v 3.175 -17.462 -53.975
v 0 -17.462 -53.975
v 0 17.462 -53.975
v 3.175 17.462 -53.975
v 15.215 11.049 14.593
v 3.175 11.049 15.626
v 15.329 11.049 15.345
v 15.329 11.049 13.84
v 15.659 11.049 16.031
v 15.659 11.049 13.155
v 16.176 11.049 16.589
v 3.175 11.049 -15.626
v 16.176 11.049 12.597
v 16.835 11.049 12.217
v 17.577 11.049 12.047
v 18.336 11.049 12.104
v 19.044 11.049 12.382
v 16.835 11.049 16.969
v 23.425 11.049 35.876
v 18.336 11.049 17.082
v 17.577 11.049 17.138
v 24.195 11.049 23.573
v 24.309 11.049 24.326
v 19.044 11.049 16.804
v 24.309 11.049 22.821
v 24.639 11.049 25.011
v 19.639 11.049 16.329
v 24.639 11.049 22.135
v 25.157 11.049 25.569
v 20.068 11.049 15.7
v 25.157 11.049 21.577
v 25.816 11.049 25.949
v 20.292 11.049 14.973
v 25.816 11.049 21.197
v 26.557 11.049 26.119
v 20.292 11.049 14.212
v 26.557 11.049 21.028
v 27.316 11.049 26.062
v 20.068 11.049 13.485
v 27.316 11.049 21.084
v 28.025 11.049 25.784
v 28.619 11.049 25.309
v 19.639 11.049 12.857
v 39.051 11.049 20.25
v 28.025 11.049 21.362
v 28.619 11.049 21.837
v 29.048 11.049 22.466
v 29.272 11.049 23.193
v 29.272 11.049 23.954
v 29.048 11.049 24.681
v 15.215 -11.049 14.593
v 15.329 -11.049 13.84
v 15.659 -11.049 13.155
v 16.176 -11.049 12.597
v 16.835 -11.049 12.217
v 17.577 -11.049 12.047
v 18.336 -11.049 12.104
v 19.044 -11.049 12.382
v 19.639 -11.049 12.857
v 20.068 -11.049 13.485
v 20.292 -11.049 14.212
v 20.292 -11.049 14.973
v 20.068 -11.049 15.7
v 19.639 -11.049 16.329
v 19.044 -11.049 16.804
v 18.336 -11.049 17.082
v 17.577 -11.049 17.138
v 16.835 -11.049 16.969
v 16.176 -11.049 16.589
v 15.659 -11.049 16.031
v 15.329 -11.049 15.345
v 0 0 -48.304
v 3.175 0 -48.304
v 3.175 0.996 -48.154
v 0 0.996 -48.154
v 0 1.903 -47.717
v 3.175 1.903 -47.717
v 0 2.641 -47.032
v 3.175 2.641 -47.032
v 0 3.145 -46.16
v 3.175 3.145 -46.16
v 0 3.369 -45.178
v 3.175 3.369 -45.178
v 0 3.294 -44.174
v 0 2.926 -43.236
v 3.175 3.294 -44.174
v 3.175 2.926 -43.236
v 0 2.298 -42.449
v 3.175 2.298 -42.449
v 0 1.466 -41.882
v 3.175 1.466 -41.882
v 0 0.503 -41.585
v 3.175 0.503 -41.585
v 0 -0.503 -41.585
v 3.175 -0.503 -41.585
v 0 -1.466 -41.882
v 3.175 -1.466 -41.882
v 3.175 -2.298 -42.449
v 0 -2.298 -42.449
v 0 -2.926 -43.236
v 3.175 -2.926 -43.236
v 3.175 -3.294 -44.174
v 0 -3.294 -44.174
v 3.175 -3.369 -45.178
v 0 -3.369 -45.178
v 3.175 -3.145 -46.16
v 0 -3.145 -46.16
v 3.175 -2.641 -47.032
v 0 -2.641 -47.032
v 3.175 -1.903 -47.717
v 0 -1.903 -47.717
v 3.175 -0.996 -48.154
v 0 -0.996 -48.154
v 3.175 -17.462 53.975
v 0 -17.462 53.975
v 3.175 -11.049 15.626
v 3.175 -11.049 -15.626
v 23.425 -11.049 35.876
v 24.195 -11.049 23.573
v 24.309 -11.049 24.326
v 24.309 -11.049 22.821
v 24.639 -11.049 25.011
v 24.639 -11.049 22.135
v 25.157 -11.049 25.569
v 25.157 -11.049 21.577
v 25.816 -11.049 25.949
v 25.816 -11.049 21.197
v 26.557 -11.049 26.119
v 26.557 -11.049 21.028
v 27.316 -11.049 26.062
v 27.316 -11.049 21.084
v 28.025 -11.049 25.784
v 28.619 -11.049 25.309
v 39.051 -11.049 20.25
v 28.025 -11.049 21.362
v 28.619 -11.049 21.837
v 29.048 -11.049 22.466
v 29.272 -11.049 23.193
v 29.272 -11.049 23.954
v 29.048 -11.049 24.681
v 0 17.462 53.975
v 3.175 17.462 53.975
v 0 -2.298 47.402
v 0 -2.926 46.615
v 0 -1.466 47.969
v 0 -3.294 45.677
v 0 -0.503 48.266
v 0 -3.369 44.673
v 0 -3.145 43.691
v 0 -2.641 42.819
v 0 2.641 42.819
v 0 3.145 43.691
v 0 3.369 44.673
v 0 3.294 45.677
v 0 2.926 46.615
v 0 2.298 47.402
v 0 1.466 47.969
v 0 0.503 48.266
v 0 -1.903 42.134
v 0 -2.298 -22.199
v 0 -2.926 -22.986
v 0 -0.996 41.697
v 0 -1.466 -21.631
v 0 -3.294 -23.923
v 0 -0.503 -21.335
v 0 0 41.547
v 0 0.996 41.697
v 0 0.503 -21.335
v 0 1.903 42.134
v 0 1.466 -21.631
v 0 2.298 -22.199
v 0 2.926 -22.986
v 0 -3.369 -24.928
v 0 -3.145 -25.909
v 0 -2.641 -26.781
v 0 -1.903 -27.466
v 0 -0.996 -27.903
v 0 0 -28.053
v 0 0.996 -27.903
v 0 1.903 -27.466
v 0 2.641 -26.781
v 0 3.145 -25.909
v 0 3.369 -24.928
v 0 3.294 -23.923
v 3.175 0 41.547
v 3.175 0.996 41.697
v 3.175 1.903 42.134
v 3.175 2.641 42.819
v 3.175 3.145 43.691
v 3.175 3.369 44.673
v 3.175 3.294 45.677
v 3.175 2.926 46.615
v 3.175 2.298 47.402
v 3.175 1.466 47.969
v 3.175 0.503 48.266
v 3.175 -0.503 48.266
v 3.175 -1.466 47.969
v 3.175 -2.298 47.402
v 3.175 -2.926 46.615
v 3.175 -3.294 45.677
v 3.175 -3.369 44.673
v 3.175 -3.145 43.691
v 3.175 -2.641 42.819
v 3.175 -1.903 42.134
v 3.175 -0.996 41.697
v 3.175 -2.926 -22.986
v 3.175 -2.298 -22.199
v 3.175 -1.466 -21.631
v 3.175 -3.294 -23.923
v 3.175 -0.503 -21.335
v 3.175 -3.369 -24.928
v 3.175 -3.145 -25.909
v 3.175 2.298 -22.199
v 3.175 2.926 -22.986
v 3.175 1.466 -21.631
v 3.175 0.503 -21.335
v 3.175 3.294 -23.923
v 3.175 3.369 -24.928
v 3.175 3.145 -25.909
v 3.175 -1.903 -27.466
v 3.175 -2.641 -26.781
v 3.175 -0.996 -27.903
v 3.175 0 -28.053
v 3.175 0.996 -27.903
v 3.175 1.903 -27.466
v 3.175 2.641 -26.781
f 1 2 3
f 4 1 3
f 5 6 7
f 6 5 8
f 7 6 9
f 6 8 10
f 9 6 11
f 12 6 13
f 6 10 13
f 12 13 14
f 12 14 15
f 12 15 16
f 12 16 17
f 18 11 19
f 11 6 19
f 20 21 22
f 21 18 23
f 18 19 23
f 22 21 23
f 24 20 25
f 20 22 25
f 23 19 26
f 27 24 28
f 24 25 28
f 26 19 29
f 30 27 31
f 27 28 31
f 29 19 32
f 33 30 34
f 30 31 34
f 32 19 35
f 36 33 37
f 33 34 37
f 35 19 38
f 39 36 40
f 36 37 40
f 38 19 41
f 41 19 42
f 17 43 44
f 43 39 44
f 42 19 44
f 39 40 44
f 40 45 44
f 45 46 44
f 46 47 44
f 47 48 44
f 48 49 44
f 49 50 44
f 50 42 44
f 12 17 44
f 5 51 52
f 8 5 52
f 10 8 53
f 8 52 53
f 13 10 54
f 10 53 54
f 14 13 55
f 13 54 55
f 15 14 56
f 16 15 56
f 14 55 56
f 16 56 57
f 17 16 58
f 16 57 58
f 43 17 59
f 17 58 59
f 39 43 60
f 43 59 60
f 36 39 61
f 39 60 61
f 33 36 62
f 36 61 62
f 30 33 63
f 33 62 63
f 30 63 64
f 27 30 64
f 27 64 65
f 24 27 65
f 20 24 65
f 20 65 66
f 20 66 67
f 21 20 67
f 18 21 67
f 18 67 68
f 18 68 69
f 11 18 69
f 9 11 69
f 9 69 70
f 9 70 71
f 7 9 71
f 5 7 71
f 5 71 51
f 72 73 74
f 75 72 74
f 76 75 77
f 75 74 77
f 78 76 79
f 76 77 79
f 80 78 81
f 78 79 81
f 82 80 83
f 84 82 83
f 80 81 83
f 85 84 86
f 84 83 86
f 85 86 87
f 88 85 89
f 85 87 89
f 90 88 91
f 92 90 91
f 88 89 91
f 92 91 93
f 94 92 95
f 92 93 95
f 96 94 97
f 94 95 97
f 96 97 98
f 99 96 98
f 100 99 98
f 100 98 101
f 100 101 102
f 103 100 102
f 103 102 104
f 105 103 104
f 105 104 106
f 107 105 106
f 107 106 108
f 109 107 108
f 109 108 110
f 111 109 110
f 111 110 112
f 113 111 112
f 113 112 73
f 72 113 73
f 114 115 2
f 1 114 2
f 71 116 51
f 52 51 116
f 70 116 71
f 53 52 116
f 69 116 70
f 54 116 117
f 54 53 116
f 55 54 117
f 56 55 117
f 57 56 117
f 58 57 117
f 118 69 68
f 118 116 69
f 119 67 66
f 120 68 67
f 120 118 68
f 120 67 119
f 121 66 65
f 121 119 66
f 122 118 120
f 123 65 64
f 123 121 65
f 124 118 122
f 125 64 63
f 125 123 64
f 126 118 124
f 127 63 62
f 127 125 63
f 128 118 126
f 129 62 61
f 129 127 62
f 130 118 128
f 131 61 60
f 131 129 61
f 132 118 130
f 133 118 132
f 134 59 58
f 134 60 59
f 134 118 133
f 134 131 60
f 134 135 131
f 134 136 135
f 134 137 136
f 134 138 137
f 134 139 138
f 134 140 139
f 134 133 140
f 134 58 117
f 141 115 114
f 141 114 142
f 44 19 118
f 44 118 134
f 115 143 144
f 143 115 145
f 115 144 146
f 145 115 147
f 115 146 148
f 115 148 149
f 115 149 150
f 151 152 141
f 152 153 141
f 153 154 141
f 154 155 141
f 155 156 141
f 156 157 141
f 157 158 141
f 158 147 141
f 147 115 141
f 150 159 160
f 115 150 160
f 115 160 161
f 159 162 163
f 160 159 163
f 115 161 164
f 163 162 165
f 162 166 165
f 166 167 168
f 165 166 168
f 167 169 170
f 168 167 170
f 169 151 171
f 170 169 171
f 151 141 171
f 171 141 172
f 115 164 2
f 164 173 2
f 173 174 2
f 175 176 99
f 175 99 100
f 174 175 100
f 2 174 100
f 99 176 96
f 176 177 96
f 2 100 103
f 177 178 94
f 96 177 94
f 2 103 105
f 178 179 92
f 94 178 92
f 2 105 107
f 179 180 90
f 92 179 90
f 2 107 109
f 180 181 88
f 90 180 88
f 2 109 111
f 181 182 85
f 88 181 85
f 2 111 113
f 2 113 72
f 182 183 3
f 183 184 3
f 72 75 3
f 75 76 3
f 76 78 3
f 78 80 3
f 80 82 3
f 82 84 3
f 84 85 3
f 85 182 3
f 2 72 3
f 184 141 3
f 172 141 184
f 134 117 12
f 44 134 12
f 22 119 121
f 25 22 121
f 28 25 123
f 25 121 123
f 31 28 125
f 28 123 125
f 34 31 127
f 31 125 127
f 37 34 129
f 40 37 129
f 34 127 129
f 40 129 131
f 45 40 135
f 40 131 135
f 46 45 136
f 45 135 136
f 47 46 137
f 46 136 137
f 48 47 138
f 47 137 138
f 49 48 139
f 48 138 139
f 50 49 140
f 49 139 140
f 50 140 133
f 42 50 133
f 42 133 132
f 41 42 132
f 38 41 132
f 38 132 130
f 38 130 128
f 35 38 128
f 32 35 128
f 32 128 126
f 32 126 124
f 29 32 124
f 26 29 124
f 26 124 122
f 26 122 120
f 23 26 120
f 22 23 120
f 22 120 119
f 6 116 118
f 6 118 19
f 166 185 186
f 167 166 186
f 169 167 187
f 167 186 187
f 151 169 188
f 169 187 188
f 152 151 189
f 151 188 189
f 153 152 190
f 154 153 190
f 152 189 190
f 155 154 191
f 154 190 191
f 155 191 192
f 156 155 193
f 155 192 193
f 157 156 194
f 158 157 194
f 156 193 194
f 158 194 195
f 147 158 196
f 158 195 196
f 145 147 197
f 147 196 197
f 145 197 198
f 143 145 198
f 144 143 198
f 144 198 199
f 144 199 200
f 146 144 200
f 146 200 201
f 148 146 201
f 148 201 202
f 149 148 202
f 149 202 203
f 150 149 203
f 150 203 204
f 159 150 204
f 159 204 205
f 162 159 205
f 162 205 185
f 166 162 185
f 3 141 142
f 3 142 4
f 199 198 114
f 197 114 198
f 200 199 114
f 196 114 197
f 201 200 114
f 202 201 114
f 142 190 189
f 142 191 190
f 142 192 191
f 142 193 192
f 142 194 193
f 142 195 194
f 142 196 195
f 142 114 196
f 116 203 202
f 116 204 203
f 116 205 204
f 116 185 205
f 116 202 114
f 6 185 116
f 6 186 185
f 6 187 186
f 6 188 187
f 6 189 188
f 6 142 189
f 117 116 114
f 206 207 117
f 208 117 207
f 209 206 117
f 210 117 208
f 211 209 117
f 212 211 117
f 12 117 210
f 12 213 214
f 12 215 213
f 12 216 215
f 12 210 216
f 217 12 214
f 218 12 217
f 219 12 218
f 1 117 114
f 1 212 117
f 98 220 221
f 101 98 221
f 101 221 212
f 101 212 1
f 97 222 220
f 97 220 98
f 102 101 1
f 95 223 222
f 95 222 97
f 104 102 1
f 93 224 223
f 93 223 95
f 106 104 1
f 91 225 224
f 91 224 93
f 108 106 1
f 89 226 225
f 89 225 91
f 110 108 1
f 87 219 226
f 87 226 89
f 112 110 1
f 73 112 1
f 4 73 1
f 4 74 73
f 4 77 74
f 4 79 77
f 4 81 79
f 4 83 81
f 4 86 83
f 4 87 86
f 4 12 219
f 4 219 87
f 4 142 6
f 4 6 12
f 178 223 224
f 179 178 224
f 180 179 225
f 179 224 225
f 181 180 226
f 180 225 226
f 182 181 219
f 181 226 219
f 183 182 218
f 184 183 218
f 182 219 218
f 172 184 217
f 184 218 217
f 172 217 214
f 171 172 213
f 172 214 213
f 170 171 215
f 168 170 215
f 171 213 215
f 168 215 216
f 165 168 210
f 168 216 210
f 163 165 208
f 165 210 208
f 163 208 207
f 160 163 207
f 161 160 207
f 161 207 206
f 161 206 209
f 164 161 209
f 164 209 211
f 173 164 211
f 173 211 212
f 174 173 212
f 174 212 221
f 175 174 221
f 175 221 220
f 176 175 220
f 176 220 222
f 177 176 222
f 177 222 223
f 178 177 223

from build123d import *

# Parameters (mm, degrees)
SKETCH1_W               = 107.95
SKETCH1_H               = 34.925
BOSS_EXTRUDE1_DEPTH     = 3.175
BOSS_EXTRUDE2_REACH     = 92.429
SKETCH4_W               = 22.098
SKETCH4_H               = 22.098
CUT_EXTRUDE1_REACH      = 69.122
SKETCH5_R               = 3.3782
F_1_4_20_TAPPED_HOLE1_D = 5.1054


with BuildPart() as part:
    # Sketch1 → Boss-Extrude1 (new body)
    with BuildSketch(Plane(origin=(0, 0, 0), x_dir=(0, 0, -1), z_dir=(1, 0, 0))):
        Rectangle(SKETCH1_W, SKETCH1_H)
    extrude(amount=BOSS_EXTRUDE1_DEPTH)

    # Boss-Extrude2: up to this plane
    boss_extrude2_end = Plane(origin=(3.175, 0, 0), z_dir=(1, 0, 0))
    # Sketch4 → Boss-Extrude2 (add, up to the surface)
    with BuildSketch(Plane(origin=(29.650800378, 0, 29.650800378), x_dir=(0.707106781186546, 0, -0.707106781186549), z_dir=(0.707106781186549, 0, 0.707106781186546)), mode=Mode.PRIVATE) as boss_extrude2_sk1:
        with Locations((2.24506403, 0)):
            Rectangle(SKETCH4_W, SKETCH4_H)
    boss_extrude2_tool1 = split(extrude(boss_extrude2_sk1.sketch, amount=-BOSS_EXTRUDE2_REACH, mode=Mode.PRIVATE), bisect_by=boss_extrude2_end, keep=Keep.BOTH, mode=Mode.PRIVATE)
    add(boss_extrude2_tool1.solids().sort_by_distance((31.2383, 0, 28.0633))[0])

    # Sketch5 → Cut-Extrude1 (cut, up to next)
    with BuildSketch(Plane(origin=(3.175, 0, 0), x_dir=(0, 0, -1), z_dir=(1, 0, 0)), mode=Mode.PRIVATE) as cut_extrude1_sk1:
        with Locations((-44.925561602, 0)):
            Circle(SKETCH5_R)
    cut_extrude1_tool1 = extrude(cut_extrude1_sk1.sketch, amount=-CUT_EXTRUDE1_REACH, mode=Mode.PRIVATE) & part.part
    # Sketch5 → Cut-Extrude1 (cut, up to next)
    with BuildSketch(Plane(origin=(3.175, 0, 0), x_dir=(0, 0, -1), z_dir=(1, 0, 0)), mode=Mode.PRIVATE) as cut_extrude1_sk2:
        with Locations((24.675084049, 0)):
            Circle(SKETCH5_R)
    cut_extrude1_tool2 = extrude(cut_extrude1_sk2.sketch, amount=-CUT_EXTRUDE1_REACH, mode=Mode.PRIVATE) & part.part
    # Sketch5 → Cut-Extrude1 (cut, up to next)
    with BuildSketch(Plane(origin=(3.175, 0, 0), x_dir=(0, 0, -1), z_dir=(1, 0, 0)), mode=Mode.PRIVATE) as cut_extrude1_sk3:
        with Locations((44.925561602, 0)):
            Circle(SKETCH5_R)
    cut_extrude1_tool3 = extrude(cut_extrude1_sk3.sketch, amount=-CUT_EXTRUDE1_REACH, mode=Mode.PRIVATE) & part.part
    add(cut_extrude1_tool1.solids().sort_by_distance((3.175, 0, 44.925562))[0], mode=Mode.SUBTRACT)
    add(cut_extrude1_tool2.solids().sort_by_distance((3.175, 0, -24.675084))[0], mode=Mode.SUBTRACT)
    add(cut_extrude1_tool3.solids().sort_by_distance((3.175, 0, -44.925562))[0], mode=Mode.SUBTRACT)

    # 1/4-20 Tapped Hole1 (through all)
    with Locations(Plane(origin=(0, 11.049, 0), x_dir=(1, 0, 0), z_dir=(0, 1, 0))):
        with Locations((17.767916197, -14.592916197), (26.748172318, -23.573172318)):
            Hole(F_1_4_20_TAPPED_HOLE1_D / 2)


solid = part.part
